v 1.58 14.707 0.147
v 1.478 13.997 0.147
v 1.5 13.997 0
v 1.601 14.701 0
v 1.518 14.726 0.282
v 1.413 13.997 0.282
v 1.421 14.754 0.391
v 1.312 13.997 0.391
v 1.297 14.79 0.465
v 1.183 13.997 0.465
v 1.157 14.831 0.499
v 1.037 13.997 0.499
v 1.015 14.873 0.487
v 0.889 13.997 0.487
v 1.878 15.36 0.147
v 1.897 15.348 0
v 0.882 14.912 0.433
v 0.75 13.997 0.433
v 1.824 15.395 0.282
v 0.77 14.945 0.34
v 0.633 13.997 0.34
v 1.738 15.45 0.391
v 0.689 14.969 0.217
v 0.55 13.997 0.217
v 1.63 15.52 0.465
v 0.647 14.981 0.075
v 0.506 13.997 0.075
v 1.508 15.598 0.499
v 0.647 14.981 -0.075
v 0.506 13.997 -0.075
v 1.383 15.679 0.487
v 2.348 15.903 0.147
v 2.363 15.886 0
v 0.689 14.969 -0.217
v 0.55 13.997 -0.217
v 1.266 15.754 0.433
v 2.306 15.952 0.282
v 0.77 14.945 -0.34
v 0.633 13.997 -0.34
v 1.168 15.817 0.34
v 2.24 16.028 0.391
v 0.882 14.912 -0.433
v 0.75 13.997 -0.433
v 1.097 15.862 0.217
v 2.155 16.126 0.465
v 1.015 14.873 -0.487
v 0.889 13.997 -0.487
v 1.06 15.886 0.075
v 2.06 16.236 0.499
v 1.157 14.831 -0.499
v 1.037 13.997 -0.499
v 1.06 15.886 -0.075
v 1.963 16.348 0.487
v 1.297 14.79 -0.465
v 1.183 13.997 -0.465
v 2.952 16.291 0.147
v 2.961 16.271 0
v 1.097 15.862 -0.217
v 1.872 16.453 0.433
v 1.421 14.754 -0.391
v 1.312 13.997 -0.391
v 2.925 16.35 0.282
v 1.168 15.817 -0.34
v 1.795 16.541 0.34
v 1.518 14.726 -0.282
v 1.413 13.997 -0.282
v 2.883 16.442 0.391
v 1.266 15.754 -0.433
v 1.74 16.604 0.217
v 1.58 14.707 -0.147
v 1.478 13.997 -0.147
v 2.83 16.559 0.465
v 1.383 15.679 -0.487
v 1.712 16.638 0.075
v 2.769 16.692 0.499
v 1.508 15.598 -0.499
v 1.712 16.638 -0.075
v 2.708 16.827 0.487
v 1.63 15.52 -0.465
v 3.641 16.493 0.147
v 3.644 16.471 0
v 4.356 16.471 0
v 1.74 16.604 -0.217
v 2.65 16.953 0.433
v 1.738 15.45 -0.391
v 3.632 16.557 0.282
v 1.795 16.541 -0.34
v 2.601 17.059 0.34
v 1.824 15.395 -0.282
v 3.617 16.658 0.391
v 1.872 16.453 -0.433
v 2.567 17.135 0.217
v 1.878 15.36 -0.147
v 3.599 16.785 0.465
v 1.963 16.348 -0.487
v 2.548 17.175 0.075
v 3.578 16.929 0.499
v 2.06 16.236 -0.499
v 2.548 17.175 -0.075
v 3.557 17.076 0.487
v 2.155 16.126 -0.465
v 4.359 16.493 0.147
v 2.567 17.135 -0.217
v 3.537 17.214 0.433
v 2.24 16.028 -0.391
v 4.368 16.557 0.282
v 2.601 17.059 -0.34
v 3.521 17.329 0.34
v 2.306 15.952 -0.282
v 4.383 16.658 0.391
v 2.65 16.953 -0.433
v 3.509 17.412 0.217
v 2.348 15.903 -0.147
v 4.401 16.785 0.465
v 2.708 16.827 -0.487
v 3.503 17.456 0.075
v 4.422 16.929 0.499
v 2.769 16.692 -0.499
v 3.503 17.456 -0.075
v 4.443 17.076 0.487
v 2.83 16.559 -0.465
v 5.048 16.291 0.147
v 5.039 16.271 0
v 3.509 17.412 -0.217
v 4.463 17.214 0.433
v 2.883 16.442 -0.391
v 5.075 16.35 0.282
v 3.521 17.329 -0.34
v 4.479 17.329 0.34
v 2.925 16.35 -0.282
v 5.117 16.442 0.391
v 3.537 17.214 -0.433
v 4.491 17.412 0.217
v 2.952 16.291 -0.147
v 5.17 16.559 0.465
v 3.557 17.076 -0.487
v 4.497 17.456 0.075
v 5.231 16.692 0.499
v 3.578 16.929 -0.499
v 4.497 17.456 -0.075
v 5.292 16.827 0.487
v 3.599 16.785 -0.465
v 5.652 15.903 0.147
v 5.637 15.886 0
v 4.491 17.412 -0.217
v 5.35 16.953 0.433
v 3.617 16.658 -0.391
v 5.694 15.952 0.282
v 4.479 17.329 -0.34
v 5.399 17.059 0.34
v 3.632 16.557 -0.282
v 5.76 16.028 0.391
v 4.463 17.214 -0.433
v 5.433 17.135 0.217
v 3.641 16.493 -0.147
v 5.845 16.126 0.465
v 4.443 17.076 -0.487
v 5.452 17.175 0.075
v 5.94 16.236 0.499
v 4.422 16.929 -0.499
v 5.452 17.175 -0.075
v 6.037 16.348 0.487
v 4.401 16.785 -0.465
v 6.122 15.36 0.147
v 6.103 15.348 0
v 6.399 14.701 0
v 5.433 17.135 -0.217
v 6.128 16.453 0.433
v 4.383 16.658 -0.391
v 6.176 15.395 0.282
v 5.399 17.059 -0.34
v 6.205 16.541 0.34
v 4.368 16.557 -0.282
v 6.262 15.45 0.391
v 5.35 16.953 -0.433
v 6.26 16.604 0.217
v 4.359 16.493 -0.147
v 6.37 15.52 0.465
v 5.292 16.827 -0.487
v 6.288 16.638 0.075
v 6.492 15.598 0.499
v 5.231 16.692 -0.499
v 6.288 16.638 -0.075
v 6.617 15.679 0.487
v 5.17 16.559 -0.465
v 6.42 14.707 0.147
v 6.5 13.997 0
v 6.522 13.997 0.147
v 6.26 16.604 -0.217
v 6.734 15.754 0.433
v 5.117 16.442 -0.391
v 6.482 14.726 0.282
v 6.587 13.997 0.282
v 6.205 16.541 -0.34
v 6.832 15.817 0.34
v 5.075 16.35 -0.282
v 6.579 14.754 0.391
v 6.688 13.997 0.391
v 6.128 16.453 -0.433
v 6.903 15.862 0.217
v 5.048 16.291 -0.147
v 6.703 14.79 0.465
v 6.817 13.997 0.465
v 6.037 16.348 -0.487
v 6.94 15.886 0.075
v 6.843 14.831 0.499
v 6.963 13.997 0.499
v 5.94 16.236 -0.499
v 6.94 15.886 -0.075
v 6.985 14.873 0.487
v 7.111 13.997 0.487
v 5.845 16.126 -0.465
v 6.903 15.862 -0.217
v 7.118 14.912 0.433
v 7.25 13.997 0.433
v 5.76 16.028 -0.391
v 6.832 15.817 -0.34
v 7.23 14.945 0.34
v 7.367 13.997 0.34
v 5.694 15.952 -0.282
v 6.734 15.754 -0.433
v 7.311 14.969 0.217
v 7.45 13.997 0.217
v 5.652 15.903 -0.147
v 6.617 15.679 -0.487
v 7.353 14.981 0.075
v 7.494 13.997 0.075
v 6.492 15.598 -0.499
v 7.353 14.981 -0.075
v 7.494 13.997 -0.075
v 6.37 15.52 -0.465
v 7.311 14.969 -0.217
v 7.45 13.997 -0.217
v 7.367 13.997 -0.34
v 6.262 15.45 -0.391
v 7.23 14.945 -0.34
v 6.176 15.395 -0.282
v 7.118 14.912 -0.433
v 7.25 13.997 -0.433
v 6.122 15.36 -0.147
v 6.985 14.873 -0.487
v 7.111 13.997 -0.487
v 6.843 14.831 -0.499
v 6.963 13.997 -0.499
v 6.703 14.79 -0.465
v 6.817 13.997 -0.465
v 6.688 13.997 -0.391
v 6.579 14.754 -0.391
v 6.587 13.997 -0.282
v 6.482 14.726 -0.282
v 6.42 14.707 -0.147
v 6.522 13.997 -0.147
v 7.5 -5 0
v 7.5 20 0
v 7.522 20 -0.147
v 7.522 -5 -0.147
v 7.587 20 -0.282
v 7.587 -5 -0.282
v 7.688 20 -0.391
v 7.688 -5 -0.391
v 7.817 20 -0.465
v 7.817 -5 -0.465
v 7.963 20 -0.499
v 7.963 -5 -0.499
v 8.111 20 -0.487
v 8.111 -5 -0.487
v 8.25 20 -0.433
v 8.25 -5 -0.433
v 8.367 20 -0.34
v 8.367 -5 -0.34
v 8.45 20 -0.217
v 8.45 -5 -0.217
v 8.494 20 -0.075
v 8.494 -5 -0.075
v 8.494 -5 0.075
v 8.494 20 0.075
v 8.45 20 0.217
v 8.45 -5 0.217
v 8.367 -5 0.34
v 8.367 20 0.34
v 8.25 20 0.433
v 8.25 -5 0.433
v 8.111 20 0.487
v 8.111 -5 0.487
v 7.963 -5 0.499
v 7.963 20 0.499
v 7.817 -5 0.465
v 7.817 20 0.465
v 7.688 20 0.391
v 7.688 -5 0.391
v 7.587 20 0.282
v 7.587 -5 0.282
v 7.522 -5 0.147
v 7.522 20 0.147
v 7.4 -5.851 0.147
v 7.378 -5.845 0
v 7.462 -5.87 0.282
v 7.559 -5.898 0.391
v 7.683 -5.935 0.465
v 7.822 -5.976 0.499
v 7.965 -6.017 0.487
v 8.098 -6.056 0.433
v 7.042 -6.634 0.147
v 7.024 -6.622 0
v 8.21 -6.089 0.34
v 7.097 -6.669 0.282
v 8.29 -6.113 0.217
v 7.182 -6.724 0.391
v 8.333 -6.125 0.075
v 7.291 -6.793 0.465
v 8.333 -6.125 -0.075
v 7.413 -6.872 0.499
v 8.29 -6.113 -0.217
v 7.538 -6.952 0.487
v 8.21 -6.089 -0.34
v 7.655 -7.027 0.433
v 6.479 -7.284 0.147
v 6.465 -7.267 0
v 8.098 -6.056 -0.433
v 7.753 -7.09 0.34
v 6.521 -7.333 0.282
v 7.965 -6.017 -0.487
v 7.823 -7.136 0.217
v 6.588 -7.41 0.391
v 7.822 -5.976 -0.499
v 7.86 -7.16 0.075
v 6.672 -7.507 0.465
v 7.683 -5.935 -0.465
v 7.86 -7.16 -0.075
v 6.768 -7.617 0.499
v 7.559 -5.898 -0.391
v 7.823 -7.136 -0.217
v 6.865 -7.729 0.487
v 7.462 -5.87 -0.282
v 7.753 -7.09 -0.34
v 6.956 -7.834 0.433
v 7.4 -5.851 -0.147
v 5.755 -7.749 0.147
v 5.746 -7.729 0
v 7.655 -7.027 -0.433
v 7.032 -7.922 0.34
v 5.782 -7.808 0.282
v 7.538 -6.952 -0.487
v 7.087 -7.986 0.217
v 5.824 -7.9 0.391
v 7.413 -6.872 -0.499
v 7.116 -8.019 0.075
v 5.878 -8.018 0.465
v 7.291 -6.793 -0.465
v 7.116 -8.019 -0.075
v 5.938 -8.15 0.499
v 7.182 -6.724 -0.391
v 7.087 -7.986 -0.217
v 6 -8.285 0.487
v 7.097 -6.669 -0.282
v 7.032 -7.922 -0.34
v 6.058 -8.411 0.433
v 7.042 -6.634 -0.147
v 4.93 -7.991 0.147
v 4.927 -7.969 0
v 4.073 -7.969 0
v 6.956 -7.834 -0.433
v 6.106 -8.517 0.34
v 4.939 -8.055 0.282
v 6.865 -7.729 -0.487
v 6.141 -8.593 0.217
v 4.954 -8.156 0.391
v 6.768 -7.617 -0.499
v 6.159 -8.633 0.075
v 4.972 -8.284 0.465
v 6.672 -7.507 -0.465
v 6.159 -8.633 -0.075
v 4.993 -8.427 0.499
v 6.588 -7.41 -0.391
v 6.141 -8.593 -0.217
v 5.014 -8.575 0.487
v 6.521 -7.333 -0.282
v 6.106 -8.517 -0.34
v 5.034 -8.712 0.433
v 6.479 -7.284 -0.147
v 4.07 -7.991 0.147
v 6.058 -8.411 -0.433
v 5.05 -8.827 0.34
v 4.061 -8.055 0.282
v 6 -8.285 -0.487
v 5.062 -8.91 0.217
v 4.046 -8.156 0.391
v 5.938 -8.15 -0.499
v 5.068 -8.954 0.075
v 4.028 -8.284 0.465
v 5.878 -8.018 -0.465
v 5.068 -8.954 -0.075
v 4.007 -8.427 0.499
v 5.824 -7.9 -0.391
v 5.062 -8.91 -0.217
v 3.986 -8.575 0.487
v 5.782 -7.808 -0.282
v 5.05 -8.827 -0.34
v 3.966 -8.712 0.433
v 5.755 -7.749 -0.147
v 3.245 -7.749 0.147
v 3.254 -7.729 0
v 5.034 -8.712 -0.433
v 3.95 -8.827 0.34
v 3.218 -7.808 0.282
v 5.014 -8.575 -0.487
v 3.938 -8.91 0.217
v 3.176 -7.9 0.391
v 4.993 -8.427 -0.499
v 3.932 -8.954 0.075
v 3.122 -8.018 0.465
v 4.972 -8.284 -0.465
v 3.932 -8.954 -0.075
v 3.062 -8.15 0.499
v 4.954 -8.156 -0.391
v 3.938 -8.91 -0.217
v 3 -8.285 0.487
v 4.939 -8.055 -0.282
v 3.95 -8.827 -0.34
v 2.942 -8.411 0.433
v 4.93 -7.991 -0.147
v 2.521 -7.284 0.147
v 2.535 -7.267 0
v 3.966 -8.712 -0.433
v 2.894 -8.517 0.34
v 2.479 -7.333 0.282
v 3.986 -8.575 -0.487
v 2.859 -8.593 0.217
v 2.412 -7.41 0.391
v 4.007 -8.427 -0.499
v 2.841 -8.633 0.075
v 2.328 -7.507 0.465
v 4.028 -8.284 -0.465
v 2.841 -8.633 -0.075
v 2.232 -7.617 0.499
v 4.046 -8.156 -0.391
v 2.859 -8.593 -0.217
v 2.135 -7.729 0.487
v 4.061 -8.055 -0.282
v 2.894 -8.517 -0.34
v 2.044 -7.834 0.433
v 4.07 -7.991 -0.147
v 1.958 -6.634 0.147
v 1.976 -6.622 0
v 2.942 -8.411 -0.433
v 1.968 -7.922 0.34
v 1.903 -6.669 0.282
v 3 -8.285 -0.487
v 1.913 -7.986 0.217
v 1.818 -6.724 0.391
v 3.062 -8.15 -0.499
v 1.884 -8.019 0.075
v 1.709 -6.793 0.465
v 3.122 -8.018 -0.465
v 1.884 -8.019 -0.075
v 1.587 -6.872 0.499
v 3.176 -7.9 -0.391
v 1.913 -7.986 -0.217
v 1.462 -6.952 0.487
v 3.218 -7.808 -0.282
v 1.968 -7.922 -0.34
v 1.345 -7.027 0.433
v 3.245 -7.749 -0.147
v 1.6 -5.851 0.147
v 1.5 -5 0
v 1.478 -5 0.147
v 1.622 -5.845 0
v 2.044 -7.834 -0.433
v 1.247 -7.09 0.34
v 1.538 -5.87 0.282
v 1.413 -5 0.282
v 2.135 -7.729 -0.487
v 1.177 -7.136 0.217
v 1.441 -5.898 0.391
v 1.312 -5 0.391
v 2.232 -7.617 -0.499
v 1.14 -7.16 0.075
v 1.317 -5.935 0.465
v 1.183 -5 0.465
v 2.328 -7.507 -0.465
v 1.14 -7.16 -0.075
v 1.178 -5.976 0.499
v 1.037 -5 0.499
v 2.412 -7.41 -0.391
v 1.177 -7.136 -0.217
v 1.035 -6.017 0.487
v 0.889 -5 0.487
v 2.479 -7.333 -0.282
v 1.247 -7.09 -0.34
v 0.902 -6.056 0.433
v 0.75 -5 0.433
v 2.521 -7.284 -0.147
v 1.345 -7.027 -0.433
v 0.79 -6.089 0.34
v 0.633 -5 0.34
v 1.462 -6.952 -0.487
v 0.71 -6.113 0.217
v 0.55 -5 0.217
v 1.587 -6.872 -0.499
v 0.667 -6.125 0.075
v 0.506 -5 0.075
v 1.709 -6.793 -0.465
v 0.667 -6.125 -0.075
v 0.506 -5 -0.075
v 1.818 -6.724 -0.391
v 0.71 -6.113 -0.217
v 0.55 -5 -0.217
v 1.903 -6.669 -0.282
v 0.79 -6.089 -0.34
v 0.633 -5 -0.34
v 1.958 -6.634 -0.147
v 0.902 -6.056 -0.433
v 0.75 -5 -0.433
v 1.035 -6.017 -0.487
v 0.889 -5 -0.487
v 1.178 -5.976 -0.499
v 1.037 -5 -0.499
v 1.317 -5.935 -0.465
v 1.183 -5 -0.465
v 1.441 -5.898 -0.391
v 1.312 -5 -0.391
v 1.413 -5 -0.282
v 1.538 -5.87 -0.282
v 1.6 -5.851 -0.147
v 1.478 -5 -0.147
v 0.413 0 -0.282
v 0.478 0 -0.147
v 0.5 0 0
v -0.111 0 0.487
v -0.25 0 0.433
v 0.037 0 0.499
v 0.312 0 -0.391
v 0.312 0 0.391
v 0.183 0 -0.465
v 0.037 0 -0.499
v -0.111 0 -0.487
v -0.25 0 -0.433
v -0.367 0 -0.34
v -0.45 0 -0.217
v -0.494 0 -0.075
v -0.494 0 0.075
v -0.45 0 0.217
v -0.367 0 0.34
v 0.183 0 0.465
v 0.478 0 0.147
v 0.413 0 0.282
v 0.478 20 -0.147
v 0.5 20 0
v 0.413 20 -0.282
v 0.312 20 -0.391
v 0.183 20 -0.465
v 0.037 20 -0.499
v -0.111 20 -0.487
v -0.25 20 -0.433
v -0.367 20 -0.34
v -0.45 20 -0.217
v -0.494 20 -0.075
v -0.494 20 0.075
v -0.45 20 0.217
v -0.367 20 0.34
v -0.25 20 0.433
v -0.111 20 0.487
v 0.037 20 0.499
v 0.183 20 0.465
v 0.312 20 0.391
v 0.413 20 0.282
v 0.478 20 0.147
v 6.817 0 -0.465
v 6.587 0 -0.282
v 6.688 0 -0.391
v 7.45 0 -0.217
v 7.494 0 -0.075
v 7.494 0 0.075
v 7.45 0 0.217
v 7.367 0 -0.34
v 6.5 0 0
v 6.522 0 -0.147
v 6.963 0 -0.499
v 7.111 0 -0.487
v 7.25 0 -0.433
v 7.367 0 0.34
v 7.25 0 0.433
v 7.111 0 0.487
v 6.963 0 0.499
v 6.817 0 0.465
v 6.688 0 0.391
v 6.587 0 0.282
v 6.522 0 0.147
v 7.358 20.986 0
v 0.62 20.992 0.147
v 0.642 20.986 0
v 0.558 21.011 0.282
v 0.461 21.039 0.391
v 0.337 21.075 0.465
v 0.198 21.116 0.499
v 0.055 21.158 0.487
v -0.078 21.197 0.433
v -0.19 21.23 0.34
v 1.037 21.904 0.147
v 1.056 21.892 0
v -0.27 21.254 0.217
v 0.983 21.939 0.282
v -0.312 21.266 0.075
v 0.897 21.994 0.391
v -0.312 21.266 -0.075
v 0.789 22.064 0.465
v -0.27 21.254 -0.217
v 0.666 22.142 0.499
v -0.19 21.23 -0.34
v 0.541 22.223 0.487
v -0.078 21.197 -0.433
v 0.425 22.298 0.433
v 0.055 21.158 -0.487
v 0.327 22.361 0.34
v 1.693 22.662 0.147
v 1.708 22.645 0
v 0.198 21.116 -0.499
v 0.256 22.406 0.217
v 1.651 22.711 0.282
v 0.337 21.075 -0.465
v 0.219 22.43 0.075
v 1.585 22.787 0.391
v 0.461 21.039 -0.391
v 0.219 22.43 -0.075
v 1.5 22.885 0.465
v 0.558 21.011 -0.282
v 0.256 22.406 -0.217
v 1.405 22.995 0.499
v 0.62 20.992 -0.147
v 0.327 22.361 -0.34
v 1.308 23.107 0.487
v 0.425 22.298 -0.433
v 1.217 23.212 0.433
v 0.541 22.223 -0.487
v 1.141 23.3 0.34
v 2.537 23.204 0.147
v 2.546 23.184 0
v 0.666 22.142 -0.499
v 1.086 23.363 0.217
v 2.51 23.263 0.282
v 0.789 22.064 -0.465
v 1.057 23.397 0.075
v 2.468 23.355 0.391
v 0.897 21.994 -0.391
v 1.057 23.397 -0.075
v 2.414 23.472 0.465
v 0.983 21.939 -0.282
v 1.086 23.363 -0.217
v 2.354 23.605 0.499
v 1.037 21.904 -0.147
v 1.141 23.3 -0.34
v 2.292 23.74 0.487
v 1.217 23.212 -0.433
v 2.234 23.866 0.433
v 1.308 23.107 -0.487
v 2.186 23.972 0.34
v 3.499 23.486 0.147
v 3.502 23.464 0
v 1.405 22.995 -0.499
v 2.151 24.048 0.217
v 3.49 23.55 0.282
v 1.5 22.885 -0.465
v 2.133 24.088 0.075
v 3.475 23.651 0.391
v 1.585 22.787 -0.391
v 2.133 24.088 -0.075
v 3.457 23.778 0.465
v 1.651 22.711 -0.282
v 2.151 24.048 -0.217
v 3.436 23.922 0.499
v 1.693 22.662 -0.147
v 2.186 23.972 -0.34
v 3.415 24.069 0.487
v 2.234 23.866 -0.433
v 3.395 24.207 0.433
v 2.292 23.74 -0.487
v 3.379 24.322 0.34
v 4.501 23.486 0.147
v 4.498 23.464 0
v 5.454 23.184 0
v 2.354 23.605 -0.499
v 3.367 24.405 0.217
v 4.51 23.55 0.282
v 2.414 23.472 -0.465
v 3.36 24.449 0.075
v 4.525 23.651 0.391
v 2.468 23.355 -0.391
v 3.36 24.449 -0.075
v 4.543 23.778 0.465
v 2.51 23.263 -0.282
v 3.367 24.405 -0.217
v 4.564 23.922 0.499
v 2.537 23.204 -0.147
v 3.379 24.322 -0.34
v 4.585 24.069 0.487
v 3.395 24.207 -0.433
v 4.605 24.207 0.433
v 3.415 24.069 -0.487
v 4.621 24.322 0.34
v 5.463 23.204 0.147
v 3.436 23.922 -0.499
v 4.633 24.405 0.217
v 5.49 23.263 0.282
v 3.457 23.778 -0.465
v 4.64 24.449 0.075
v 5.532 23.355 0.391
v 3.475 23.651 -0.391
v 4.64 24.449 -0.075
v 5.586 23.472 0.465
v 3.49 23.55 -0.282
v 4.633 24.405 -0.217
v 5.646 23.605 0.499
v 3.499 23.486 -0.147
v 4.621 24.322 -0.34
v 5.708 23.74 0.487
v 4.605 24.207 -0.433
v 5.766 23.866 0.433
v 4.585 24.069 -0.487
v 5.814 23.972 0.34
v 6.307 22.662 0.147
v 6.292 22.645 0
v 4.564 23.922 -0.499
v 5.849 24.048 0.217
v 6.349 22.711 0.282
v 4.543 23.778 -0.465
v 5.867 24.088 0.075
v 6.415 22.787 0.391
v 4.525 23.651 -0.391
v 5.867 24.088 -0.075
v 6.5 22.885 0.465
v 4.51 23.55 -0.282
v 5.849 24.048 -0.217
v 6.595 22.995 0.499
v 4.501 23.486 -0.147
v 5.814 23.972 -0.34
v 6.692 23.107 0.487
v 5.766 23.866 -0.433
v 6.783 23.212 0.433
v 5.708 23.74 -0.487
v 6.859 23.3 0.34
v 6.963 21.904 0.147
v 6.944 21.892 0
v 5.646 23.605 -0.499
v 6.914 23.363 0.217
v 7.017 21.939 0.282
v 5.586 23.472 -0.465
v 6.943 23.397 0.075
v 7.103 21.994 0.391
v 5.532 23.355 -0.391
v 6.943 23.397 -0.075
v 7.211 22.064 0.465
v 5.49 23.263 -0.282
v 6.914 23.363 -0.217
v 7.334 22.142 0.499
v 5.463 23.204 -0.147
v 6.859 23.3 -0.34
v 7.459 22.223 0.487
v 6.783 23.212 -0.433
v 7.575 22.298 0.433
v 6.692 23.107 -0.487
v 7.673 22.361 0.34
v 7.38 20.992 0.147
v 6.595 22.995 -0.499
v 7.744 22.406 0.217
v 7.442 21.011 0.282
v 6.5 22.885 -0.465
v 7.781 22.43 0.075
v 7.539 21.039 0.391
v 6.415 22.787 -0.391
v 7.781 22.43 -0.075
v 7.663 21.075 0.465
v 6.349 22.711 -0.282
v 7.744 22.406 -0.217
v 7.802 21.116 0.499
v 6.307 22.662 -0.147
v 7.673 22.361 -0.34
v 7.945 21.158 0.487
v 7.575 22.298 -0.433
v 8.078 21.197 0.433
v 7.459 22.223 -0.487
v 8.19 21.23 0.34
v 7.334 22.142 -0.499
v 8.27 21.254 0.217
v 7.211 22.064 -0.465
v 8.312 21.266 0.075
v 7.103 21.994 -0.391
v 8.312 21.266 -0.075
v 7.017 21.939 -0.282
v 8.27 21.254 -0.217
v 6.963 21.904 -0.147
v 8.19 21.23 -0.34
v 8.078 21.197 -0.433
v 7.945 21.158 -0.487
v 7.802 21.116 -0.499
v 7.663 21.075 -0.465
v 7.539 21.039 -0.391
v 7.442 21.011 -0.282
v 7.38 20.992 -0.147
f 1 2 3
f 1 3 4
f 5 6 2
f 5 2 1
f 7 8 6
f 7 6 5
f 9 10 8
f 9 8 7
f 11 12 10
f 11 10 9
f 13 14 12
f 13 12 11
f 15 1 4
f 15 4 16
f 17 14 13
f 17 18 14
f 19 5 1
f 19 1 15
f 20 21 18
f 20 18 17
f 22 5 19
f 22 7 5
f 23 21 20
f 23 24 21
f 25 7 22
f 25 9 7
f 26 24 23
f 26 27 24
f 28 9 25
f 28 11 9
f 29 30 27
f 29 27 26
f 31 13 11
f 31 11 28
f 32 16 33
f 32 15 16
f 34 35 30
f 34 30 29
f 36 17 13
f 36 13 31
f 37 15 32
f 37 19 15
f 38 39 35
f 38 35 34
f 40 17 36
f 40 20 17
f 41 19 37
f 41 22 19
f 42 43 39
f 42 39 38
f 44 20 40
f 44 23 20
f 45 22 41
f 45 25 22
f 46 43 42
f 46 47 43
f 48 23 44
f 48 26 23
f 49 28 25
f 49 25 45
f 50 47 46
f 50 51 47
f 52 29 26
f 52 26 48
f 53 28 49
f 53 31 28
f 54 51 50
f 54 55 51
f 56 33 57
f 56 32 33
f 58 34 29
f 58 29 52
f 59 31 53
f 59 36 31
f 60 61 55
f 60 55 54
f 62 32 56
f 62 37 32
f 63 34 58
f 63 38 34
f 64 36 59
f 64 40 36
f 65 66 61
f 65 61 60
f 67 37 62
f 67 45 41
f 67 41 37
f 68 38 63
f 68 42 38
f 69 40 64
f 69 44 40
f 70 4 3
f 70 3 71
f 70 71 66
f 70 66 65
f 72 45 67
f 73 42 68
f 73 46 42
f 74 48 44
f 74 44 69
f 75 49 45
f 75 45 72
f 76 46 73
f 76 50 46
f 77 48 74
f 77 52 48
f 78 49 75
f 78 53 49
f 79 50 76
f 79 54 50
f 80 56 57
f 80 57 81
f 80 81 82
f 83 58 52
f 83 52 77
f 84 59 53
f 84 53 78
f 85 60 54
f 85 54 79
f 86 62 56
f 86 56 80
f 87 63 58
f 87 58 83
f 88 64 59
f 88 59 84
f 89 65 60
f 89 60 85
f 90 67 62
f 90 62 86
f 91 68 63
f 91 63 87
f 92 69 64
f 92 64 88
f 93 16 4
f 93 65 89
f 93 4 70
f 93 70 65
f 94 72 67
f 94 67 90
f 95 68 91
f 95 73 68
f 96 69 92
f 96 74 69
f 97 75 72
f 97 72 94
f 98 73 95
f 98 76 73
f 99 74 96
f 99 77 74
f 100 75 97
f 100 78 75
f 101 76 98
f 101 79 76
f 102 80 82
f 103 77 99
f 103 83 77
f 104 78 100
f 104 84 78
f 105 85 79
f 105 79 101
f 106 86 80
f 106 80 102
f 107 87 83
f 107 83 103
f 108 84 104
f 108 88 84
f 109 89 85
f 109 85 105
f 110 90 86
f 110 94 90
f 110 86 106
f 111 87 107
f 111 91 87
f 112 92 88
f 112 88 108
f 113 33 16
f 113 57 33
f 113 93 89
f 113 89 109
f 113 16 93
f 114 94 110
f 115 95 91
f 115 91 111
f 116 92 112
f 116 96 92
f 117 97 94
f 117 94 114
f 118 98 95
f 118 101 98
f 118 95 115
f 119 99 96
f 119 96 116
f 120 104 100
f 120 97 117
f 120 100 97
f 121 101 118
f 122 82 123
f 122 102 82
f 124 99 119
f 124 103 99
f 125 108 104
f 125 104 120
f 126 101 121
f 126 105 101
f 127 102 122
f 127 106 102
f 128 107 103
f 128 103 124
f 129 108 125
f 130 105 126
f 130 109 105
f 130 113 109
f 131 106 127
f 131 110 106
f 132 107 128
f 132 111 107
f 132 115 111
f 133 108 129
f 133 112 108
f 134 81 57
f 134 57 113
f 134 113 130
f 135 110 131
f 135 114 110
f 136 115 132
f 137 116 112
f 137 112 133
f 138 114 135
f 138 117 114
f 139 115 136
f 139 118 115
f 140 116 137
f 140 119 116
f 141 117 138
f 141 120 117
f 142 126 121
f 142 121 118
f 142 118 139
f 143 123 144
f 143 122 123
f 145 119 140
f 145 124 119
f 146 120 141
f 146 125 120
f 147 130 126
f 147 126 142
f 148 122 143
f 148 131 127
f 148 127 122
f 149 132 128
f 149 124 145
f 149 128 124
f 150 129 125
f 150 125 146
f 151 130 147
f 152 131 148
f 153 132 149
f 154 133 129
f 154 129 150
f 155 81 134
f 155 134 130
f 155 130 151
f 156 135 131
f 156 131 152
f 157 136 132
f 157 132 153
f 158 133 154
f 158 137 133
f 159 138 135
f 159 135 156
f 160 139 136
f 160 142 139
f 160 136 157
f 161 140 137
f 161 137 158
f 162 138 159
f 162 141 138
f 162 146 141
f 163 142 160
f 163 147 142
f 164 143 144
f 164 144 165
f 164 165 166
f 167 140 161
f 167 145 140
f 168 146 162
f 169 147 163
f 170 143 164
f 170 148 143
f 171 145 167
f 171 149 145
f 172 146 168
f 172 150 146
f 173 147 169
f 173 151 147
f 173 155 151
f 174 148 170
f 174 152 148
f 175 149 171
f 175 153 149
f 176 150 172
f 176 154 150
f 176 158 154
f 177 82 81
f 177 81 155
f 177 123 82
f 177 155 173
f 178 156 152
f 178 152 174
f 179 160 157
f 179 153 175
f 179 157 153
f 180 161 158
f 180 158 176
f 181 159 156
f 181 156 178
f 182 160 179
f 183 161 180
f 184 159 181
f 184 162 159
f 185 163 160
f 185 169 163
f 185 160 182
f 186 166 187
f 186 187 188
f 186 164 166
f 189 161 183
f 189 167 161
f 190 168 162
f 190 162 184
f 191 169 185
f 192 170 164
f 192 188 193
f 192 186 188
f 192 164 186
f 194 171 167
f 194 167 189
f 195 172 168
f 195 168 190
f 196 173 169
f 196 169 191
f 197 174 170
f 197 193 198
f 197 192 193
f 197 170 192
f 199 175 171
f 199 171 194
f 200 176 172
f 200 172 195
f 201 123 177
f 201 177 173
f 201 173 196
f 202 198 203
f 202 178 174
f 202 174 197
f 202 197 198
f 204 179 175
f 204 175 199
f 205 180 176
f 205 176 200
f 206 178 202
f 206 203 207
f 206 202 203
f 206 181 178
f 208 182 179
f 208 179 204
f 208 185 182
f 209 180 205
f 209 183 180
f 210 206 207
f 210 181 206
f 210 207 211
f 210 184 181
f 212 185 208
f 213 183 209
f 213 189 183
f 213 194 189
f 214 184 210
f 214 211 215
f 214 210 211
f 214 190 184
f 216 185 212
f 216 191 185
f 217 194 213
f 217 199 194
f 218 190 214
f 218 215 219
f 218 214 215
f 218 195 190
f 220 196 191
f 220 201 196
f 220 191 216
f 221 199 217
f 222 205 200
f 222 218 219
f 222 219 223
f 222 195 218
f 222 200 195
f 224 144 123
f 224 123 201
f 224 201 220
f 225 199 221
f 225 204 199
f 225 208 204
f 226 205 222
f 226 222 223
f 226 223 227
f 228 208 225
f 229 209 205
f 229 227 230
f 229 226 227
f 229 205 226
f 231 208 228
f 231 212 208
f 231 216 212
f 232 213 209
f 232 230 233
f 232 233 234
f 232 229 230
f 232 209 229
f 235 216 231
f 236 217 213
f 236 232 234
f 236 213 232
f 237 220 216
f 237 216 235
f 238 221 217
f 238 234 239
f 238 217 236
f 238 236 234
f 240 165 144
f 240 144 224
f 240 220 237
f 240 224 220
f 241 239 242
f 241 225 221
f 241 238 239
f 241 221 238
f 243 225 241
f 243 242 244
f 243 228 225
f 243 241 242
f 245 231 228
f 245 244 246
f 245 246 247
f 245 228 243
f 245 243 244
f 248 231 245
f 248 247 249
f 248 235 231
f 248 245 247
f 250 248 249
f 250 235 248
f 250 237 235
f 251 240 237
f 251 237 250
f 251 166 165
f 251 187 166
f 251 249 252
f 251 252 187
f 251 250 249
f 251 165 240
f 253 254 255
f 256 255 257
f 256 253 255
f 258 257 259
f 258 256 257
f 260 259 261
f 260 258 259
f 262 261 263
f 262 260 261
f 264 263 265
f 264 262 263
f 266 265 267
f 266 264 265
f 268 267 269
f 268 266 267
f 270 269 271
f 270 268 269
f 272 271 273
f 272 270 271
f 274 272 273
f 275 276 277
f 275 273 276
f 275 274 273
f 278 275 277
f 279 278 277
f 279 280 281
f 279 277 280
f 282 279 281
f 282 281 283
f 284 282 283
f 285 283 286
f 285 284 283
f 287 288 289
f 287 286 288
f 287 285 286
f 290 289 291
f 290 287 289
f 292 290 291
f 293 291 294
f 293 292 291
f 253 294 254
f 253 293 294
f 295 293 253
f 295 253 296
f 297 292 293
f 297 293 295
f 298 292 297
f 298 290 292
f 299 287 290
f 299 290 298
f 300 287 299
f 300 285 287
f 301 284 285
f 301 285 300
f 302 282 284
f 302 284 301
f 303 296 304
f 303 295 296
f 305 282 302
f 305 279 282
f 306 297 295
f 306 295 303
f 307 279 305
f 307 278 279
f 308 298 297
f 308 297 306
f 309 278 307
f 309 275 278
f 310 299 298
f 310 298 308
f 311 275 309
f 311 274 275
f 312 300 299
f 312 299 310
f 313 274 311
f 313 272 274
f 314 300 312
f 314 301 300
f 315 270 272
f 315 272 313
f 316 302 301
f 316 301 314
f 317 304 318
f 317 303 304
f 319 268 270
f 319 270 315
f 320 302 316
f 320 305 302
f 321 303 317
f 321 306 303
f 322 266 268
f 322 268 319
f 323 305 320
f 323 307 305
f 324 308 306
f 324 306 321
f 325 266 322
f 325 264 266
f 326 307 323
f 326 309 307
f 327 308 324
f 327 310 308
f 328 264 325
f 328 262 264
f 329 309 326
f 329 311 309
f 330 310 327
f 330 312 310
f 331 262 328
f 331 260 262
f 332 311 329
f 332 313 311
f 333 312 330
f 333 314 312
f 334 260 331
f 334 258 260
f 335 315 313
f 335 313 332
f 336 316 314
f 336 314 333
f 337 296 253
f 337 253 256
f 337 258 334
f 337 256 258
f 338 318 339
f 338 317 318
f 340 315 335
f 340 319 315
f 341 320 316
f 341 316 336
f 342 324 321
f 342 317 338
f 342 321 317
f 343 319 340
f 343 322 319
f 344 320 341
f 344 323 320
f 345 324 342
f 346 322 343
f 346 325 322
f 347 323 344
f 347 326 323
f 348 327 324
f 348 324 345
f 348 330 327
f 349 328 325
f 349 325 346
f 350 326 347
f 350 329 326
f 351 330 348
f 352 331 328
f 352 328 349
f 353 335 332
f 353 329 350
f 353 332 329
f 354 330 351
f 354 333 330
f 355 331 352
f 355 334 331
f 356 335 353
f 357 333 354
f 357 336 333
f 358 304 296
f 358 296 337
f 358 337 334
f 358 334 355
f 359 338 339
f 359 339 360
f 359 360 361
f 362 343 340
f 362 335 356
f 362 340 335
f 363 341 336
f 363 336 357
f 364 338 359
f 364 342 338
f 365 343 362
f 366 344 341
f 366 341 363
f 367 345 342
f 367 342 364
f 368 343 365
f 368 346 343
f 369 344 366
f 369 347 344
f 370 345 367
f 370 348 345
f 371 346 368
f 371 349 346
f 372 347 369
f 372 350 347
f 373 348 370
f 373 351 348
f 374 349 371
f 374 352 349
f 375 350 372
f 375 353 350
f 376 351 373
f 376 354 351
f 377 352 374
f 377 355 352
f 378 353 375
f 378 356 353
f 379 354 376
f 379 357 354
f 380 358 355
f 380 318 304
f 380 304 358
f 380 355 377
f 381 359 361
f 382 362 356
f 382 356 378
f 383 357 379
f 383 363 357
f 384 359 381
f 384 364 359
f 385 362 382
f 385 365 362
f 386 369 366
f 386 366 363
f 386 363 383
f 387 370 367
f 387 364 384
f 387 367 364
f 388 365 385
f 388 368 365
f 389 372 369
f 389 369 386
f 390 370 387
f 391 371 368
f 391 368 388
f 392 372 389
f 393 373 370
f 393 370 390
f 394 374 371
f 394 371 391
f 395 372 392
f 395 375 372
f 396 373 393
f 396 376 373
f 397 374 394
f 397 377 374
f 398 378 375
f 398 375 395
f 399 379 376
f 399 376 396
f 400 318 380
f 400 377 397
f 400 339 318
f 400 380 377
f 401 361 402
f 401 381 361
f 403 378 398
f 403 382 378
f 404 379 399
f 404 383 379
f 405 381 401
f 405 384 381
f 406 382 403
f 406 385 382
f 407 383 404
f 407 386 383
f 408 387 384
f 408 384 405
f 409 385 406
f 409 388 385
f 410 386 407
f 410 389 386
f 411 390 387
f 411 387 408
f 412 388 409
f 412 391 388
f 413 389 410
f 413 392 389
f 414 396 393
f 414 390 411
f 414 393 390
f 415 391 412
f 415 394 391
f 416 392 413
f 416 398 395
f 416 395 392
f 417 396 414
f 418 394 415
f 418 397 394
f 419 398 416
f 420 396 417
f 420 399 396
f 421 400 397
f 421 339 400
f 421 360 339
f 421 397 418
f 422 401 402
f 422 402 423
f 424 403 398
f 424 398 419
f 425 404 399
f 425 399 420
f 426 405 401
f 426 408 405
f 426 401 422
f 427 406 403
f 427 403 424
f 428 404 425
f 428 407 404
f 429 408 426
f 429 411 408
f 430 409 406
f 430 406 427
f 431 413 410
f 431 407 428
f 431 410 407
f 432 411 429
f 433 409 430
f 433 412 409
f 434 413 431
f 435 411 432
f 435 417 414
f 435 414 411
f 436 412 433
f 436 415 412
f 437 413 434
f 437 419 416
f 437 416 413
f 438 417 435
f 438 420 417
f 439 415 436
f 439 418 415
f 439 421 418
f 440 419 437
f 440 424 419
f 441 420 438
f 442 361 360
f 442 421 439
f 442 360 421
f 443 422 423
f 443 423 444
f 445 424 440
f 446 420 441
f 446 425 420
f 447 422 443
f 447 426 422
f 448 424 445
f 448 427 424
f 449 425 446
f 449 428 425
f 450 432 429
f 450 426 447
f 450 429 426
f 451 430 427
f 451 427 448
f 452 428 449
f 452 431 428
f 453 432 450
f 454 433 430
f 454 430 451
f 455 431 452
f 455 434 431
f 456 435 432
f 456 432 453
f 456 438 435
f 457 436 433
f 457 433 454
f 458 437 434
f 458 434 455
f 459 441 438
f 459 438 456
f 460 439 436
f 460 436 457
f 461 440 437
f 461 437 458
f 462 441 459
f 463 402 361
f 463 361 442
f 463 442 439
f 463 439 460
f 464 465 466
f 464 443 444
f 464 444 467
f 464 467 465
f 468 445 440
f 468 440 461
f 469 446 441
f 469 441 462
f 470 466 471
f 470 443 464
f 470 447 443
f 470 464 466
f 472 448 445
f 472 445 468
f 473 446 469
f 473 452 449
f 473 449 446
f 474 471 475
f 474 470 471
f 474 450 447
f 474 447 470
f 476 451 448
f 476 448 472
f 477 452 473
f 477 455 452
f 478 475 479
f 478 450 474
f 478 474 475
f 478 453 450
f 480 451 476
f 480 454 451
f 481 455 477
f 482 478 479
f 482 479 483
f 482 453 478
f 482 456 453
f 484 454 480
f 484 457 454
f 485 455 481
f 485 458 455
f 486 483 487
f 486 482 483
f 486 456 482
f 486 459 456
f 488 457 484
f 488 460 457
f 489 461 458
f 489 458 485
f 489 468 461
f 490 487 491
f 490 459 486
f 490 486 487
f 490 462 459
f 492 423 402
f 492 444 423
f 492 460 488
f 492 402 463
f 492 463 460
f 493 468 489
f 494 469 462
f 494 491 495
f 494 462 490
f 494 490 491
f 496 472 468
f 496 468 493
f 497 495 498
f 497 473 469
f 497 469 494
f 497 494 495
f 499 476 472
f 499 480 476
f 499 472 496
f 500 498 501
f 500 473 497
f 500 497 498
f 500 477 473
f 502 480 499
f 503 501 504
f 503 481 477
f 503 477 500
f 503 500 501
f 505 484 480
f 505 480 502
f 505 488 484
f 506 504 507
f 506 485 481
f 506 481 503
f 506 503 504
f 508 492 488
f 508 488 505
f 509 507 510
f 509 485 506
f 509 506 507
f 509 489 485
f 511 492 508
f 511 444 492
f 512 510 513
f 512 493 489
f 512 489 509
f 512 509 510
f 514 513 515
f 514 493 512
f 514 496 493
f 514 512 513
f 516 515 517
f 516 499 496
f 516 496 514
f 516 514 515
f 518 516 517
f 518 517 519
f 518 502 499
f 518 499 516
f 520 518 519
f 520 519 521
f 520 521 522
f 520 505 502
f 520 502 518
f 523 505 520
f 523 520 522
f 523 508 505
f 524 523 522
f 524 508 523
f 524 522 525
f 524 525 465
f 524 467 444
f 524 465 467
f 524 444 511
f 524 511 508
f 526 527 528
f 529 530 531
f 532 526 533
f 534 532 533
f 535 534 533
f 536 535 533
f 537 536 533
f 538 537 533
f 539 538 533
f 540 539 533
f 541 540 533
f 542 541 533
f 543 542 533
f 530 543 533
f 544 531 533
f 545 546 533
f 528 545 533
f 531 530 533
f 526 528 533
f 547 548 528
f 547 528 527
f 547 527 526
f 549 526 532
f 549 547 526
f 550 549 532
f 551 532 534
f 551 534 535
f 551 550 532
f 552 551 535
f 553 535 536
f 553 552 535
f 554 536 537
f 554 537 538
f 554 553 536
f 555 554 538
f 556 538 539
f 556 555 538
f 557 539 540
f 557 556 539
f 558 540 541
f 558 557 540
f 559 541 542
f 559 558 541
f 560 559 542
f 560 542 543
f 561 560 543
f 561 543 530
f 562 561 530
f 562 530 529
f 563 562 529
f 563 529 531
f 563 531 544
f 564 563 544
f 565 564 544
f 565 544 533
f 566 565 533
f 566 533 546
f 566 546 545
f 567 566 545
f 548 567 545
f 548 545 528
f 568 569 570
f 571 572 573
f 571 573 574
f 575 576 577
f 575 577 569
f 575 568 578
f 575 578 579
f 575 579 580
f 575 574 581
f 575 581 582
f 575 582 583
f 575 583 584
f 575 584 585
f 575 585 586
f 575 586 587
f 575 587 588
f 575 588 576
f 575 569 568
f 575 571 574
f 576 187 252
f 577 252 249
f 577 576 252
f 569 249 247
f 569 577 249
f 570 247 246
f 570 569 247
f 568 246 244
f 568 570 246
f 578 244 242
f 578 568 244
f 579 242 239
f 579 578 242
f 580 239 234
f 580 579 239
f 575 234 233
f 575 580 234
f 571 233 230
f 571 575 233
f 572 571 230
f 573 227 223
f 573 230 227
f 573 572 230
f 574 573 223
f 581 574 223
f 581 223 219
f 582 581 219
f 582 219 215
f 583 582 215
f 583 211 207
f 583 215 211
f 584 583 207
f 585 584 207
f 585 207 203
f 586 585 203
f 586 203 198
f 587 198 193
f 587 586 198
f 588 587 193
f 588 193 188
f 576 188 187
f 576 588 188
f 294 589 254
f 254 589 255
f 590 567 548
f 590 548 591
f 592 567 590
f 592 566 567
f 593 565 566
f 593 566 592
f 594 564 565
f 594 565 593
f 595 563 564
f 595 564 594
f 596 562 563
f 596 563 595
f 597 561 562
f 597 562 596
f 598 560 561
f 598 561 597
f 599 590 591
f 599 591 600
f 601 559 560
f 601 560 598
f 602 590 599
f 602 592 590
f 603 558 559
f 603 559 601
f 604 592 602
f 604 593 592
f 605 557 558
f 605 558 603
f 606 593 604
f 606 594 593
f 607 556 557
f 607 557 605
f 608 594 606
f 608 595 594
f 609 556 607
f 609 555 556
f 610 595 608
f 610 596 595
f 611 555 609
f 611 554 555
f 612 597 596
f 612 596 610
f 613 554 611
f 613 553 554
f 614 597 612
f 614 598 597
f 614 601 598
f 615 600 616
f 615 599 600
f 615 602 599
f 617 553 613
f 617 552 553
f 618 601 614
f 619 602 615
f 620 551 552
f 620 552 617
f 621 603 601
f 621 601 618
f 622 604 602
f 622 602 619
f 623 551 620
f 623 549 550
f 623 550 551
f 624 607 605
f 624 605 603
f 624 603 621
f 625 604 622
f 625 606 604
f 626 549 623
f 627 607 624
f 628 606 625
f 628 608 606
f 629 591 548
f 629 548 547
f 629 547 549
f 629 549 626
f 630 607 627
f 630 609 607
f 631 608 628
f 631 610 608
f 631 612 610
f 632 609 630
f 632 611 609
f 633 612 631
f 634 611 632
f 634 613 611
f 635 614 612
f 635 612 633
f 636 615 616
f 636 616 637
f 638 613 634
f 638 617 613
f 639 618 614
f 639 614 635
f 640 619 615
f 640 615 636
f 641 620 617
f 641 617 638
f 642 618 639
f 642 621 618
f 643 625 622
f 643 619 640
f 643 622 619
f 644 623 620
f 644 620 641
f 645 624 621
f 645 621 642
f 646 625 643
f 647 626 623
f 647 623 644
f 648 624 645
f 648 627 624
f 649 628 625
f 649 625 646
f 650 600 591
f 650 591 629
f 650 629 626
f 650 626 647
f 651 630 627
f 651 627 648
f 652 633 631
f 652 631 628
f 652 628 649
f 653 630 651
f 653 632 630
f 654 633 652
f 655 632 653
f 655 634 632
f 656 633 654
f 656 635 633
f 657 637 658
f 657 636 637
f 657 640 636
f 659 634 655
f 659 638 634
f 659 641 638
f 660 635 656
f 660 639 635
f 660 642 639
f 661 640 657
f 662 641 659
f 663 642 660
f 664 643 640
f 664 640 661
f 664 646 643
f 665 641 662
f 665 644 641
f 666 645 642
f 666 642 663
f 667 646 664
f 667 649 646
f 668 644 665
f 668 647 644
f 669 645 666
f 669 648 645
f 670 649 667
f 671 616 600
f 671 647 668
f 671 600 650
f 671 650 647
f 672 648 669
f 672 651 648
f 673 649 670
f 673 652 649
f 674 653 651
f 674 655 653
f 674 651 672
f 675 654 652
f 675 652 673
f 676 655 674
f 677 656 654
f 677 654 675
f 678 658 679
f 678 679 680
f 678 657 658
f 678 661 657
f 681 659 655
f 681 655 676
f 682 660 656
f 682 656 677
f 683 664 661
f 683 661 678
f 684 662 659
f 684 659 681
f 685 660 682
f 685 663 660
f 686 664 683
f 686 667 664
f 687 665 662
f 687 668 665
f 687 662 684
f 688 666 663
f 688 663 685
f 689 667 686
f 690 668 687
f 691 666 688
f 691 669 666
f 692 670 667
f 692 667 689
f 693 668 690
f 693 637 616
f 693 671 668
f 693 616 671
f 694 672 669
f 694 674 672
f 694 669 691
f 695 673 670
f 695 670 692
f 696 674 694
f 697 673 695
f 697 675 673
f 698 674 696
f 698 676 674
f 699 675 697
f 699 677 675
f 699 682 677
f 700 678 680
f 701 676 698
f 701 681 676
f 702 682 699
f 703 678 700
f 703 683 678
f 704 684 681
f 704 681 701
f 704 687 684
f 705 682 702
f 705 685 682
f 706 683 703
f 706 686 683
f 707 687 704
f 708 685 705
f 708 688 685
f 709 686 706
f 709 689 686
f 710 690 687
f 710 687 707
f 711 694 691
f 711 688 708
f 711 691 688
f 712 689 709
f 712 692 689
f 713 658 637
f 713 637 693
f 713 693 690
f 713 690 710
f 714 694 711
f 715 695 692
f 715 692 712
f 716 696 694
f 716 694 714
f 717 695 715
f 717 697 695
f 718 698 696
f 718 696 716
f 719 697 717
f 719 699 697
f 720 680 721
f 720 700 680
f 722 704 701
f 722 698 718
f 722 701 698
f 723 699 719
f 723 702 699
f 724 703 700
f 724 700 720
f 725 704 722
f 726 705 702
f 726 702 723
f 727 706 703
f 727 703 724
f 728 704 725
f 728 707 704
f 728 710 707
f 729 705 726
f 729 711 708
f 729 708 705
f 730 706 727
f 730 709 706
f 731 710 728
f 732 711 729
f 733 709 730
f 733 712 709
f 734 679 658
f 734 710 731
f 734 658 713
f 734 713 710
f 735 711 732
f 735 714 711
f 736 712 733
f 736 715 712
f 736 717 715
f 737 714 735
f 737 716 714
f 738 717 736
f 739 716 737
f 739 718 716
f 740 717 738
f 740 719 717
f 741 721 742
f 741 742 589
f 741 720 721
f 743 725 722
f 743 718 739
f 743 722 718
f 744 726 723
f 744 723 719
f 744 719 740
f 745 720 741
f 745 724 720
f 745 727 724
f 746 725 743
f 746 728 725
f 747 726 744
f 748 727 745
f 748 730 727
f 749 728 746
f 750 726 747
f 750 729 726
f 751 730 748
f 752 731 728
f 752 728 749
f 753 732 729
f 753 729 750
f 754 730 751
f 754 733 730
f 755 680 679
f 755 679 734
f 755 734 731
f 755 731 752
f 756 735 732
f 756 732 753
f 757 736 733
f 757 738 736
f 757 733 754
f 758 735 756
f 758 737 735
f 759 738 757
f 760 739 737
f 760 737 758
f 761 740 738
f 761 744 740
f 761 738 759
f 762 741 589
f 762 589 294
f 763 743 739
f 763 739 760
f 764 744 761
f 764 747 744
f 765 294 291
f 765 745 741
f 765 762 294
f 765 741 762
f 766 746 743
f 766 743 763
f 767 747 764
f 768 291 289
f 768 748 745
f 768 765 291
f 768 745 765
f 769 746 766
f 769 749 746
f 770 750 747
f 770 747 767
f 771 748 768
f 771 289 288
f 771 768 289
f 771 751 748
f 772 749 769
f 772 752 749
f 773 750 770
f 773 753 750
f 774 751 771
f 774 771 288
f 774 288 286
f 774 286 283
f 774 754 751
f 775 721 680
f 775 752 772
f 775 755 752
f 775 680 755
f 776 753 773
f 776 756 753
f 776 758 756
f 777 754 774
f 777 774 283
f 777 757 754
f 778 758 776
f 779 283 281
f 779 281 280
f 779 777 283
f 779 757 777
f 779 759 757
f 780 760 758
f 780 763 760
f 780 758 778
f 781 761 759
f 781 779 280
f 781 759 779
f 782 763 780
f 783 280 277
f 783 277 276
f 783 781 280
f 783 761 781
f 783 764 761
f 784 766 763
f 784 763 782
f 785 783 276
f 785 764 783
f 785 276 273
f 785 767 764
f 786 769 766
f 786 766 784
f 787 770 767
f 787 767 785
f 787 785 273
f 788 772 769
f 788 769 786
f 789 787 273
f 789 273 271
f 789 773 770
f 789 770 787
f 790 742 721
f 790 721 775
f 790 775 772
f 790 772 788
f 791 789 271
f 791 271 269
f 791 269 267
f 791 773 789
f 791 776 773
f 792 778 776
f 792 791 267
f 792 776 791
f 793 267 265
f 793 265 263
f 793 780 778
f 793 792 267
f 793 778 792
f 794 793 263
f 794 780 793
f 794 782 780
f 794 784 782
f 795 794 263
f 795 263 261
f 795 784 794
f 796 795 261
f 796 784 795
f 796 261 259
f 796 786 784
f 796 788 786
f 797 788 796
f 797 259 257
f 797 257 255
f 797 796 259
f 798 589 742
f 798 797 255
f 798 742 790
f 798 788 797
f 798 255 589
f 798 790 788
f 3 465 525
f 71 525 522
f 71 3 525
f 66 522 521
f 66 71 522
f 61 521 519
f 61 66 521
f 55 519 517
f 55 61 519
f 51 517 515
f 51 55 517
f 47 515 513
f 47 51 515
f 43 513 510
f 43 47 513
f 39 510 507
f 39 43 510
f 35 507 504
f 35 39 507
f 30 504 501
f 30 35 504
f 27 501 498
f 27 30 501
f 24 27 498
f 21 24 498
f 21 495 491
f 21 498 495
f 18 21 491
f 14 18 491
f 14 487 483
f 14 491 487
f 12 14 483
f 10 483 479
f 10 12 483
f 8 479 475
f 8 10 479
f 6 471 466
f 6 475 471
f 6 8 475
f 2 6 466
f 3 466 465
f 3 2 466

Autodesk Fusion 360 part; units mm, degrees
sketch "Sketch1" plane through (0, 0, 0) normal (0, 0, 1) x (1, 0, 0)
  line L0 (0, 0) -> (0, 20)
  line L1 (1, 13.9967) -> (1, -5)
  line L2 (8, 20) -> (8, -5)
  arc A0 (7, 13.9967) -> (1, 13.9967) centre (4, 13.9967) ccw
  line L3 (7, 13.9967) -> (7, 0)
  arc A1 (8, 20) -> (0, 20) centre (4, 20) ccw
  arc A2 (1, -5) -> (8, -5) centre (4.5, -5) ccw
  point P0 (8, 0)
  dimension "d3" = 25
  dimension "d4" = 20
  dimension "d24" = 8
  dimension "d25" = 6
  dimension "d27" = 7
  dimension "d28" = 5
  dimension "d29" = 6.0033
  dimension "d30" = 5
sketch "Sketch2" plane through (0, 0, 0) normal (0, 1, 0) x (1, 0, 0)
  circle A0 centre (0, 0) radius 0.5
  dimension "d7" = 1
sweep "Sweep3" add profiles "Sketch2" path "Sketch1" along L3 A0 L1 A2 L2 A1 L0 section 1
